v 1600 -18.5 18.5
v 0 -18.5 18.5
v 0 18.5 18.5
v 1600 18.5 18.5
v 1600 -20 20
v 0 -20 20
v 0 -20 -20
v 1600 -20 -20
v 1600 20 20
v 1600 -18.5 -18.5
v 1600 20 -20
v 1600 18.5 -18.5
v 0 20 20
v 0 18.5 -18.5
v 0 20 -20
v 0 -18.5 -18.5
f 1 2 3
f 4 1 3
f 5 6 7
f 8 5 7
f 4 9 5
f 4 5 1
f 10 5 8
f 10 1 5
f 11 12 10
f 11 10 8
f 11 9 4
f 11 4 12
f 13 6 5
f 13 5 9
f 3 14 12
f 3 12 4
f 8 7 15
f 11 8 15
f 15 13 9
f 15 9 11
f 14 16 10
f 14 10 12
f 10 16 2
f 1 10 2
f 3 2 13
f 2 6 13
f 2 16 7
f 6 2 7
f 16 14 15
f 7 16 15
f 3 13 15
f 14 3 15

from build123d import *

# Parameters (mm, degrees)
ESBO_O1_W                = 40
ESBO_O1_H                = 40
RESSALTO_EXTRUS_O1_DEPTH = 1600
ESBO_O2_W                = 37
ESBO_O2_H                = 37
CORTE_EXTRUS_O1_DEPTH    = 1601


with BuildPart() as part:
    # Esboço1 → Ressalto-extrusão1 (new body)
    with BuildSketch(Plane(origin=(0, 0, 0), x_dir=(0, 0, -1), z_dir=(1, 0, 0))):
        Rectangle(ESBO_O1_W, ESBO_O1_H)
    extrude(amount=RESSALTO_EXTRUS_O1_DEPTH)

    # Esboço2 → Corte-extrusão1 (cut, through all)
    with BuildSketch(Plane.ZY):
        Rectangle(ESBO_O2_W, ESBO_O2_H)
    extrude(amount=-CORTE_EXTRUS_O1_DEPTH, mode=Mode.SUBTRACT)


solid = part.part
